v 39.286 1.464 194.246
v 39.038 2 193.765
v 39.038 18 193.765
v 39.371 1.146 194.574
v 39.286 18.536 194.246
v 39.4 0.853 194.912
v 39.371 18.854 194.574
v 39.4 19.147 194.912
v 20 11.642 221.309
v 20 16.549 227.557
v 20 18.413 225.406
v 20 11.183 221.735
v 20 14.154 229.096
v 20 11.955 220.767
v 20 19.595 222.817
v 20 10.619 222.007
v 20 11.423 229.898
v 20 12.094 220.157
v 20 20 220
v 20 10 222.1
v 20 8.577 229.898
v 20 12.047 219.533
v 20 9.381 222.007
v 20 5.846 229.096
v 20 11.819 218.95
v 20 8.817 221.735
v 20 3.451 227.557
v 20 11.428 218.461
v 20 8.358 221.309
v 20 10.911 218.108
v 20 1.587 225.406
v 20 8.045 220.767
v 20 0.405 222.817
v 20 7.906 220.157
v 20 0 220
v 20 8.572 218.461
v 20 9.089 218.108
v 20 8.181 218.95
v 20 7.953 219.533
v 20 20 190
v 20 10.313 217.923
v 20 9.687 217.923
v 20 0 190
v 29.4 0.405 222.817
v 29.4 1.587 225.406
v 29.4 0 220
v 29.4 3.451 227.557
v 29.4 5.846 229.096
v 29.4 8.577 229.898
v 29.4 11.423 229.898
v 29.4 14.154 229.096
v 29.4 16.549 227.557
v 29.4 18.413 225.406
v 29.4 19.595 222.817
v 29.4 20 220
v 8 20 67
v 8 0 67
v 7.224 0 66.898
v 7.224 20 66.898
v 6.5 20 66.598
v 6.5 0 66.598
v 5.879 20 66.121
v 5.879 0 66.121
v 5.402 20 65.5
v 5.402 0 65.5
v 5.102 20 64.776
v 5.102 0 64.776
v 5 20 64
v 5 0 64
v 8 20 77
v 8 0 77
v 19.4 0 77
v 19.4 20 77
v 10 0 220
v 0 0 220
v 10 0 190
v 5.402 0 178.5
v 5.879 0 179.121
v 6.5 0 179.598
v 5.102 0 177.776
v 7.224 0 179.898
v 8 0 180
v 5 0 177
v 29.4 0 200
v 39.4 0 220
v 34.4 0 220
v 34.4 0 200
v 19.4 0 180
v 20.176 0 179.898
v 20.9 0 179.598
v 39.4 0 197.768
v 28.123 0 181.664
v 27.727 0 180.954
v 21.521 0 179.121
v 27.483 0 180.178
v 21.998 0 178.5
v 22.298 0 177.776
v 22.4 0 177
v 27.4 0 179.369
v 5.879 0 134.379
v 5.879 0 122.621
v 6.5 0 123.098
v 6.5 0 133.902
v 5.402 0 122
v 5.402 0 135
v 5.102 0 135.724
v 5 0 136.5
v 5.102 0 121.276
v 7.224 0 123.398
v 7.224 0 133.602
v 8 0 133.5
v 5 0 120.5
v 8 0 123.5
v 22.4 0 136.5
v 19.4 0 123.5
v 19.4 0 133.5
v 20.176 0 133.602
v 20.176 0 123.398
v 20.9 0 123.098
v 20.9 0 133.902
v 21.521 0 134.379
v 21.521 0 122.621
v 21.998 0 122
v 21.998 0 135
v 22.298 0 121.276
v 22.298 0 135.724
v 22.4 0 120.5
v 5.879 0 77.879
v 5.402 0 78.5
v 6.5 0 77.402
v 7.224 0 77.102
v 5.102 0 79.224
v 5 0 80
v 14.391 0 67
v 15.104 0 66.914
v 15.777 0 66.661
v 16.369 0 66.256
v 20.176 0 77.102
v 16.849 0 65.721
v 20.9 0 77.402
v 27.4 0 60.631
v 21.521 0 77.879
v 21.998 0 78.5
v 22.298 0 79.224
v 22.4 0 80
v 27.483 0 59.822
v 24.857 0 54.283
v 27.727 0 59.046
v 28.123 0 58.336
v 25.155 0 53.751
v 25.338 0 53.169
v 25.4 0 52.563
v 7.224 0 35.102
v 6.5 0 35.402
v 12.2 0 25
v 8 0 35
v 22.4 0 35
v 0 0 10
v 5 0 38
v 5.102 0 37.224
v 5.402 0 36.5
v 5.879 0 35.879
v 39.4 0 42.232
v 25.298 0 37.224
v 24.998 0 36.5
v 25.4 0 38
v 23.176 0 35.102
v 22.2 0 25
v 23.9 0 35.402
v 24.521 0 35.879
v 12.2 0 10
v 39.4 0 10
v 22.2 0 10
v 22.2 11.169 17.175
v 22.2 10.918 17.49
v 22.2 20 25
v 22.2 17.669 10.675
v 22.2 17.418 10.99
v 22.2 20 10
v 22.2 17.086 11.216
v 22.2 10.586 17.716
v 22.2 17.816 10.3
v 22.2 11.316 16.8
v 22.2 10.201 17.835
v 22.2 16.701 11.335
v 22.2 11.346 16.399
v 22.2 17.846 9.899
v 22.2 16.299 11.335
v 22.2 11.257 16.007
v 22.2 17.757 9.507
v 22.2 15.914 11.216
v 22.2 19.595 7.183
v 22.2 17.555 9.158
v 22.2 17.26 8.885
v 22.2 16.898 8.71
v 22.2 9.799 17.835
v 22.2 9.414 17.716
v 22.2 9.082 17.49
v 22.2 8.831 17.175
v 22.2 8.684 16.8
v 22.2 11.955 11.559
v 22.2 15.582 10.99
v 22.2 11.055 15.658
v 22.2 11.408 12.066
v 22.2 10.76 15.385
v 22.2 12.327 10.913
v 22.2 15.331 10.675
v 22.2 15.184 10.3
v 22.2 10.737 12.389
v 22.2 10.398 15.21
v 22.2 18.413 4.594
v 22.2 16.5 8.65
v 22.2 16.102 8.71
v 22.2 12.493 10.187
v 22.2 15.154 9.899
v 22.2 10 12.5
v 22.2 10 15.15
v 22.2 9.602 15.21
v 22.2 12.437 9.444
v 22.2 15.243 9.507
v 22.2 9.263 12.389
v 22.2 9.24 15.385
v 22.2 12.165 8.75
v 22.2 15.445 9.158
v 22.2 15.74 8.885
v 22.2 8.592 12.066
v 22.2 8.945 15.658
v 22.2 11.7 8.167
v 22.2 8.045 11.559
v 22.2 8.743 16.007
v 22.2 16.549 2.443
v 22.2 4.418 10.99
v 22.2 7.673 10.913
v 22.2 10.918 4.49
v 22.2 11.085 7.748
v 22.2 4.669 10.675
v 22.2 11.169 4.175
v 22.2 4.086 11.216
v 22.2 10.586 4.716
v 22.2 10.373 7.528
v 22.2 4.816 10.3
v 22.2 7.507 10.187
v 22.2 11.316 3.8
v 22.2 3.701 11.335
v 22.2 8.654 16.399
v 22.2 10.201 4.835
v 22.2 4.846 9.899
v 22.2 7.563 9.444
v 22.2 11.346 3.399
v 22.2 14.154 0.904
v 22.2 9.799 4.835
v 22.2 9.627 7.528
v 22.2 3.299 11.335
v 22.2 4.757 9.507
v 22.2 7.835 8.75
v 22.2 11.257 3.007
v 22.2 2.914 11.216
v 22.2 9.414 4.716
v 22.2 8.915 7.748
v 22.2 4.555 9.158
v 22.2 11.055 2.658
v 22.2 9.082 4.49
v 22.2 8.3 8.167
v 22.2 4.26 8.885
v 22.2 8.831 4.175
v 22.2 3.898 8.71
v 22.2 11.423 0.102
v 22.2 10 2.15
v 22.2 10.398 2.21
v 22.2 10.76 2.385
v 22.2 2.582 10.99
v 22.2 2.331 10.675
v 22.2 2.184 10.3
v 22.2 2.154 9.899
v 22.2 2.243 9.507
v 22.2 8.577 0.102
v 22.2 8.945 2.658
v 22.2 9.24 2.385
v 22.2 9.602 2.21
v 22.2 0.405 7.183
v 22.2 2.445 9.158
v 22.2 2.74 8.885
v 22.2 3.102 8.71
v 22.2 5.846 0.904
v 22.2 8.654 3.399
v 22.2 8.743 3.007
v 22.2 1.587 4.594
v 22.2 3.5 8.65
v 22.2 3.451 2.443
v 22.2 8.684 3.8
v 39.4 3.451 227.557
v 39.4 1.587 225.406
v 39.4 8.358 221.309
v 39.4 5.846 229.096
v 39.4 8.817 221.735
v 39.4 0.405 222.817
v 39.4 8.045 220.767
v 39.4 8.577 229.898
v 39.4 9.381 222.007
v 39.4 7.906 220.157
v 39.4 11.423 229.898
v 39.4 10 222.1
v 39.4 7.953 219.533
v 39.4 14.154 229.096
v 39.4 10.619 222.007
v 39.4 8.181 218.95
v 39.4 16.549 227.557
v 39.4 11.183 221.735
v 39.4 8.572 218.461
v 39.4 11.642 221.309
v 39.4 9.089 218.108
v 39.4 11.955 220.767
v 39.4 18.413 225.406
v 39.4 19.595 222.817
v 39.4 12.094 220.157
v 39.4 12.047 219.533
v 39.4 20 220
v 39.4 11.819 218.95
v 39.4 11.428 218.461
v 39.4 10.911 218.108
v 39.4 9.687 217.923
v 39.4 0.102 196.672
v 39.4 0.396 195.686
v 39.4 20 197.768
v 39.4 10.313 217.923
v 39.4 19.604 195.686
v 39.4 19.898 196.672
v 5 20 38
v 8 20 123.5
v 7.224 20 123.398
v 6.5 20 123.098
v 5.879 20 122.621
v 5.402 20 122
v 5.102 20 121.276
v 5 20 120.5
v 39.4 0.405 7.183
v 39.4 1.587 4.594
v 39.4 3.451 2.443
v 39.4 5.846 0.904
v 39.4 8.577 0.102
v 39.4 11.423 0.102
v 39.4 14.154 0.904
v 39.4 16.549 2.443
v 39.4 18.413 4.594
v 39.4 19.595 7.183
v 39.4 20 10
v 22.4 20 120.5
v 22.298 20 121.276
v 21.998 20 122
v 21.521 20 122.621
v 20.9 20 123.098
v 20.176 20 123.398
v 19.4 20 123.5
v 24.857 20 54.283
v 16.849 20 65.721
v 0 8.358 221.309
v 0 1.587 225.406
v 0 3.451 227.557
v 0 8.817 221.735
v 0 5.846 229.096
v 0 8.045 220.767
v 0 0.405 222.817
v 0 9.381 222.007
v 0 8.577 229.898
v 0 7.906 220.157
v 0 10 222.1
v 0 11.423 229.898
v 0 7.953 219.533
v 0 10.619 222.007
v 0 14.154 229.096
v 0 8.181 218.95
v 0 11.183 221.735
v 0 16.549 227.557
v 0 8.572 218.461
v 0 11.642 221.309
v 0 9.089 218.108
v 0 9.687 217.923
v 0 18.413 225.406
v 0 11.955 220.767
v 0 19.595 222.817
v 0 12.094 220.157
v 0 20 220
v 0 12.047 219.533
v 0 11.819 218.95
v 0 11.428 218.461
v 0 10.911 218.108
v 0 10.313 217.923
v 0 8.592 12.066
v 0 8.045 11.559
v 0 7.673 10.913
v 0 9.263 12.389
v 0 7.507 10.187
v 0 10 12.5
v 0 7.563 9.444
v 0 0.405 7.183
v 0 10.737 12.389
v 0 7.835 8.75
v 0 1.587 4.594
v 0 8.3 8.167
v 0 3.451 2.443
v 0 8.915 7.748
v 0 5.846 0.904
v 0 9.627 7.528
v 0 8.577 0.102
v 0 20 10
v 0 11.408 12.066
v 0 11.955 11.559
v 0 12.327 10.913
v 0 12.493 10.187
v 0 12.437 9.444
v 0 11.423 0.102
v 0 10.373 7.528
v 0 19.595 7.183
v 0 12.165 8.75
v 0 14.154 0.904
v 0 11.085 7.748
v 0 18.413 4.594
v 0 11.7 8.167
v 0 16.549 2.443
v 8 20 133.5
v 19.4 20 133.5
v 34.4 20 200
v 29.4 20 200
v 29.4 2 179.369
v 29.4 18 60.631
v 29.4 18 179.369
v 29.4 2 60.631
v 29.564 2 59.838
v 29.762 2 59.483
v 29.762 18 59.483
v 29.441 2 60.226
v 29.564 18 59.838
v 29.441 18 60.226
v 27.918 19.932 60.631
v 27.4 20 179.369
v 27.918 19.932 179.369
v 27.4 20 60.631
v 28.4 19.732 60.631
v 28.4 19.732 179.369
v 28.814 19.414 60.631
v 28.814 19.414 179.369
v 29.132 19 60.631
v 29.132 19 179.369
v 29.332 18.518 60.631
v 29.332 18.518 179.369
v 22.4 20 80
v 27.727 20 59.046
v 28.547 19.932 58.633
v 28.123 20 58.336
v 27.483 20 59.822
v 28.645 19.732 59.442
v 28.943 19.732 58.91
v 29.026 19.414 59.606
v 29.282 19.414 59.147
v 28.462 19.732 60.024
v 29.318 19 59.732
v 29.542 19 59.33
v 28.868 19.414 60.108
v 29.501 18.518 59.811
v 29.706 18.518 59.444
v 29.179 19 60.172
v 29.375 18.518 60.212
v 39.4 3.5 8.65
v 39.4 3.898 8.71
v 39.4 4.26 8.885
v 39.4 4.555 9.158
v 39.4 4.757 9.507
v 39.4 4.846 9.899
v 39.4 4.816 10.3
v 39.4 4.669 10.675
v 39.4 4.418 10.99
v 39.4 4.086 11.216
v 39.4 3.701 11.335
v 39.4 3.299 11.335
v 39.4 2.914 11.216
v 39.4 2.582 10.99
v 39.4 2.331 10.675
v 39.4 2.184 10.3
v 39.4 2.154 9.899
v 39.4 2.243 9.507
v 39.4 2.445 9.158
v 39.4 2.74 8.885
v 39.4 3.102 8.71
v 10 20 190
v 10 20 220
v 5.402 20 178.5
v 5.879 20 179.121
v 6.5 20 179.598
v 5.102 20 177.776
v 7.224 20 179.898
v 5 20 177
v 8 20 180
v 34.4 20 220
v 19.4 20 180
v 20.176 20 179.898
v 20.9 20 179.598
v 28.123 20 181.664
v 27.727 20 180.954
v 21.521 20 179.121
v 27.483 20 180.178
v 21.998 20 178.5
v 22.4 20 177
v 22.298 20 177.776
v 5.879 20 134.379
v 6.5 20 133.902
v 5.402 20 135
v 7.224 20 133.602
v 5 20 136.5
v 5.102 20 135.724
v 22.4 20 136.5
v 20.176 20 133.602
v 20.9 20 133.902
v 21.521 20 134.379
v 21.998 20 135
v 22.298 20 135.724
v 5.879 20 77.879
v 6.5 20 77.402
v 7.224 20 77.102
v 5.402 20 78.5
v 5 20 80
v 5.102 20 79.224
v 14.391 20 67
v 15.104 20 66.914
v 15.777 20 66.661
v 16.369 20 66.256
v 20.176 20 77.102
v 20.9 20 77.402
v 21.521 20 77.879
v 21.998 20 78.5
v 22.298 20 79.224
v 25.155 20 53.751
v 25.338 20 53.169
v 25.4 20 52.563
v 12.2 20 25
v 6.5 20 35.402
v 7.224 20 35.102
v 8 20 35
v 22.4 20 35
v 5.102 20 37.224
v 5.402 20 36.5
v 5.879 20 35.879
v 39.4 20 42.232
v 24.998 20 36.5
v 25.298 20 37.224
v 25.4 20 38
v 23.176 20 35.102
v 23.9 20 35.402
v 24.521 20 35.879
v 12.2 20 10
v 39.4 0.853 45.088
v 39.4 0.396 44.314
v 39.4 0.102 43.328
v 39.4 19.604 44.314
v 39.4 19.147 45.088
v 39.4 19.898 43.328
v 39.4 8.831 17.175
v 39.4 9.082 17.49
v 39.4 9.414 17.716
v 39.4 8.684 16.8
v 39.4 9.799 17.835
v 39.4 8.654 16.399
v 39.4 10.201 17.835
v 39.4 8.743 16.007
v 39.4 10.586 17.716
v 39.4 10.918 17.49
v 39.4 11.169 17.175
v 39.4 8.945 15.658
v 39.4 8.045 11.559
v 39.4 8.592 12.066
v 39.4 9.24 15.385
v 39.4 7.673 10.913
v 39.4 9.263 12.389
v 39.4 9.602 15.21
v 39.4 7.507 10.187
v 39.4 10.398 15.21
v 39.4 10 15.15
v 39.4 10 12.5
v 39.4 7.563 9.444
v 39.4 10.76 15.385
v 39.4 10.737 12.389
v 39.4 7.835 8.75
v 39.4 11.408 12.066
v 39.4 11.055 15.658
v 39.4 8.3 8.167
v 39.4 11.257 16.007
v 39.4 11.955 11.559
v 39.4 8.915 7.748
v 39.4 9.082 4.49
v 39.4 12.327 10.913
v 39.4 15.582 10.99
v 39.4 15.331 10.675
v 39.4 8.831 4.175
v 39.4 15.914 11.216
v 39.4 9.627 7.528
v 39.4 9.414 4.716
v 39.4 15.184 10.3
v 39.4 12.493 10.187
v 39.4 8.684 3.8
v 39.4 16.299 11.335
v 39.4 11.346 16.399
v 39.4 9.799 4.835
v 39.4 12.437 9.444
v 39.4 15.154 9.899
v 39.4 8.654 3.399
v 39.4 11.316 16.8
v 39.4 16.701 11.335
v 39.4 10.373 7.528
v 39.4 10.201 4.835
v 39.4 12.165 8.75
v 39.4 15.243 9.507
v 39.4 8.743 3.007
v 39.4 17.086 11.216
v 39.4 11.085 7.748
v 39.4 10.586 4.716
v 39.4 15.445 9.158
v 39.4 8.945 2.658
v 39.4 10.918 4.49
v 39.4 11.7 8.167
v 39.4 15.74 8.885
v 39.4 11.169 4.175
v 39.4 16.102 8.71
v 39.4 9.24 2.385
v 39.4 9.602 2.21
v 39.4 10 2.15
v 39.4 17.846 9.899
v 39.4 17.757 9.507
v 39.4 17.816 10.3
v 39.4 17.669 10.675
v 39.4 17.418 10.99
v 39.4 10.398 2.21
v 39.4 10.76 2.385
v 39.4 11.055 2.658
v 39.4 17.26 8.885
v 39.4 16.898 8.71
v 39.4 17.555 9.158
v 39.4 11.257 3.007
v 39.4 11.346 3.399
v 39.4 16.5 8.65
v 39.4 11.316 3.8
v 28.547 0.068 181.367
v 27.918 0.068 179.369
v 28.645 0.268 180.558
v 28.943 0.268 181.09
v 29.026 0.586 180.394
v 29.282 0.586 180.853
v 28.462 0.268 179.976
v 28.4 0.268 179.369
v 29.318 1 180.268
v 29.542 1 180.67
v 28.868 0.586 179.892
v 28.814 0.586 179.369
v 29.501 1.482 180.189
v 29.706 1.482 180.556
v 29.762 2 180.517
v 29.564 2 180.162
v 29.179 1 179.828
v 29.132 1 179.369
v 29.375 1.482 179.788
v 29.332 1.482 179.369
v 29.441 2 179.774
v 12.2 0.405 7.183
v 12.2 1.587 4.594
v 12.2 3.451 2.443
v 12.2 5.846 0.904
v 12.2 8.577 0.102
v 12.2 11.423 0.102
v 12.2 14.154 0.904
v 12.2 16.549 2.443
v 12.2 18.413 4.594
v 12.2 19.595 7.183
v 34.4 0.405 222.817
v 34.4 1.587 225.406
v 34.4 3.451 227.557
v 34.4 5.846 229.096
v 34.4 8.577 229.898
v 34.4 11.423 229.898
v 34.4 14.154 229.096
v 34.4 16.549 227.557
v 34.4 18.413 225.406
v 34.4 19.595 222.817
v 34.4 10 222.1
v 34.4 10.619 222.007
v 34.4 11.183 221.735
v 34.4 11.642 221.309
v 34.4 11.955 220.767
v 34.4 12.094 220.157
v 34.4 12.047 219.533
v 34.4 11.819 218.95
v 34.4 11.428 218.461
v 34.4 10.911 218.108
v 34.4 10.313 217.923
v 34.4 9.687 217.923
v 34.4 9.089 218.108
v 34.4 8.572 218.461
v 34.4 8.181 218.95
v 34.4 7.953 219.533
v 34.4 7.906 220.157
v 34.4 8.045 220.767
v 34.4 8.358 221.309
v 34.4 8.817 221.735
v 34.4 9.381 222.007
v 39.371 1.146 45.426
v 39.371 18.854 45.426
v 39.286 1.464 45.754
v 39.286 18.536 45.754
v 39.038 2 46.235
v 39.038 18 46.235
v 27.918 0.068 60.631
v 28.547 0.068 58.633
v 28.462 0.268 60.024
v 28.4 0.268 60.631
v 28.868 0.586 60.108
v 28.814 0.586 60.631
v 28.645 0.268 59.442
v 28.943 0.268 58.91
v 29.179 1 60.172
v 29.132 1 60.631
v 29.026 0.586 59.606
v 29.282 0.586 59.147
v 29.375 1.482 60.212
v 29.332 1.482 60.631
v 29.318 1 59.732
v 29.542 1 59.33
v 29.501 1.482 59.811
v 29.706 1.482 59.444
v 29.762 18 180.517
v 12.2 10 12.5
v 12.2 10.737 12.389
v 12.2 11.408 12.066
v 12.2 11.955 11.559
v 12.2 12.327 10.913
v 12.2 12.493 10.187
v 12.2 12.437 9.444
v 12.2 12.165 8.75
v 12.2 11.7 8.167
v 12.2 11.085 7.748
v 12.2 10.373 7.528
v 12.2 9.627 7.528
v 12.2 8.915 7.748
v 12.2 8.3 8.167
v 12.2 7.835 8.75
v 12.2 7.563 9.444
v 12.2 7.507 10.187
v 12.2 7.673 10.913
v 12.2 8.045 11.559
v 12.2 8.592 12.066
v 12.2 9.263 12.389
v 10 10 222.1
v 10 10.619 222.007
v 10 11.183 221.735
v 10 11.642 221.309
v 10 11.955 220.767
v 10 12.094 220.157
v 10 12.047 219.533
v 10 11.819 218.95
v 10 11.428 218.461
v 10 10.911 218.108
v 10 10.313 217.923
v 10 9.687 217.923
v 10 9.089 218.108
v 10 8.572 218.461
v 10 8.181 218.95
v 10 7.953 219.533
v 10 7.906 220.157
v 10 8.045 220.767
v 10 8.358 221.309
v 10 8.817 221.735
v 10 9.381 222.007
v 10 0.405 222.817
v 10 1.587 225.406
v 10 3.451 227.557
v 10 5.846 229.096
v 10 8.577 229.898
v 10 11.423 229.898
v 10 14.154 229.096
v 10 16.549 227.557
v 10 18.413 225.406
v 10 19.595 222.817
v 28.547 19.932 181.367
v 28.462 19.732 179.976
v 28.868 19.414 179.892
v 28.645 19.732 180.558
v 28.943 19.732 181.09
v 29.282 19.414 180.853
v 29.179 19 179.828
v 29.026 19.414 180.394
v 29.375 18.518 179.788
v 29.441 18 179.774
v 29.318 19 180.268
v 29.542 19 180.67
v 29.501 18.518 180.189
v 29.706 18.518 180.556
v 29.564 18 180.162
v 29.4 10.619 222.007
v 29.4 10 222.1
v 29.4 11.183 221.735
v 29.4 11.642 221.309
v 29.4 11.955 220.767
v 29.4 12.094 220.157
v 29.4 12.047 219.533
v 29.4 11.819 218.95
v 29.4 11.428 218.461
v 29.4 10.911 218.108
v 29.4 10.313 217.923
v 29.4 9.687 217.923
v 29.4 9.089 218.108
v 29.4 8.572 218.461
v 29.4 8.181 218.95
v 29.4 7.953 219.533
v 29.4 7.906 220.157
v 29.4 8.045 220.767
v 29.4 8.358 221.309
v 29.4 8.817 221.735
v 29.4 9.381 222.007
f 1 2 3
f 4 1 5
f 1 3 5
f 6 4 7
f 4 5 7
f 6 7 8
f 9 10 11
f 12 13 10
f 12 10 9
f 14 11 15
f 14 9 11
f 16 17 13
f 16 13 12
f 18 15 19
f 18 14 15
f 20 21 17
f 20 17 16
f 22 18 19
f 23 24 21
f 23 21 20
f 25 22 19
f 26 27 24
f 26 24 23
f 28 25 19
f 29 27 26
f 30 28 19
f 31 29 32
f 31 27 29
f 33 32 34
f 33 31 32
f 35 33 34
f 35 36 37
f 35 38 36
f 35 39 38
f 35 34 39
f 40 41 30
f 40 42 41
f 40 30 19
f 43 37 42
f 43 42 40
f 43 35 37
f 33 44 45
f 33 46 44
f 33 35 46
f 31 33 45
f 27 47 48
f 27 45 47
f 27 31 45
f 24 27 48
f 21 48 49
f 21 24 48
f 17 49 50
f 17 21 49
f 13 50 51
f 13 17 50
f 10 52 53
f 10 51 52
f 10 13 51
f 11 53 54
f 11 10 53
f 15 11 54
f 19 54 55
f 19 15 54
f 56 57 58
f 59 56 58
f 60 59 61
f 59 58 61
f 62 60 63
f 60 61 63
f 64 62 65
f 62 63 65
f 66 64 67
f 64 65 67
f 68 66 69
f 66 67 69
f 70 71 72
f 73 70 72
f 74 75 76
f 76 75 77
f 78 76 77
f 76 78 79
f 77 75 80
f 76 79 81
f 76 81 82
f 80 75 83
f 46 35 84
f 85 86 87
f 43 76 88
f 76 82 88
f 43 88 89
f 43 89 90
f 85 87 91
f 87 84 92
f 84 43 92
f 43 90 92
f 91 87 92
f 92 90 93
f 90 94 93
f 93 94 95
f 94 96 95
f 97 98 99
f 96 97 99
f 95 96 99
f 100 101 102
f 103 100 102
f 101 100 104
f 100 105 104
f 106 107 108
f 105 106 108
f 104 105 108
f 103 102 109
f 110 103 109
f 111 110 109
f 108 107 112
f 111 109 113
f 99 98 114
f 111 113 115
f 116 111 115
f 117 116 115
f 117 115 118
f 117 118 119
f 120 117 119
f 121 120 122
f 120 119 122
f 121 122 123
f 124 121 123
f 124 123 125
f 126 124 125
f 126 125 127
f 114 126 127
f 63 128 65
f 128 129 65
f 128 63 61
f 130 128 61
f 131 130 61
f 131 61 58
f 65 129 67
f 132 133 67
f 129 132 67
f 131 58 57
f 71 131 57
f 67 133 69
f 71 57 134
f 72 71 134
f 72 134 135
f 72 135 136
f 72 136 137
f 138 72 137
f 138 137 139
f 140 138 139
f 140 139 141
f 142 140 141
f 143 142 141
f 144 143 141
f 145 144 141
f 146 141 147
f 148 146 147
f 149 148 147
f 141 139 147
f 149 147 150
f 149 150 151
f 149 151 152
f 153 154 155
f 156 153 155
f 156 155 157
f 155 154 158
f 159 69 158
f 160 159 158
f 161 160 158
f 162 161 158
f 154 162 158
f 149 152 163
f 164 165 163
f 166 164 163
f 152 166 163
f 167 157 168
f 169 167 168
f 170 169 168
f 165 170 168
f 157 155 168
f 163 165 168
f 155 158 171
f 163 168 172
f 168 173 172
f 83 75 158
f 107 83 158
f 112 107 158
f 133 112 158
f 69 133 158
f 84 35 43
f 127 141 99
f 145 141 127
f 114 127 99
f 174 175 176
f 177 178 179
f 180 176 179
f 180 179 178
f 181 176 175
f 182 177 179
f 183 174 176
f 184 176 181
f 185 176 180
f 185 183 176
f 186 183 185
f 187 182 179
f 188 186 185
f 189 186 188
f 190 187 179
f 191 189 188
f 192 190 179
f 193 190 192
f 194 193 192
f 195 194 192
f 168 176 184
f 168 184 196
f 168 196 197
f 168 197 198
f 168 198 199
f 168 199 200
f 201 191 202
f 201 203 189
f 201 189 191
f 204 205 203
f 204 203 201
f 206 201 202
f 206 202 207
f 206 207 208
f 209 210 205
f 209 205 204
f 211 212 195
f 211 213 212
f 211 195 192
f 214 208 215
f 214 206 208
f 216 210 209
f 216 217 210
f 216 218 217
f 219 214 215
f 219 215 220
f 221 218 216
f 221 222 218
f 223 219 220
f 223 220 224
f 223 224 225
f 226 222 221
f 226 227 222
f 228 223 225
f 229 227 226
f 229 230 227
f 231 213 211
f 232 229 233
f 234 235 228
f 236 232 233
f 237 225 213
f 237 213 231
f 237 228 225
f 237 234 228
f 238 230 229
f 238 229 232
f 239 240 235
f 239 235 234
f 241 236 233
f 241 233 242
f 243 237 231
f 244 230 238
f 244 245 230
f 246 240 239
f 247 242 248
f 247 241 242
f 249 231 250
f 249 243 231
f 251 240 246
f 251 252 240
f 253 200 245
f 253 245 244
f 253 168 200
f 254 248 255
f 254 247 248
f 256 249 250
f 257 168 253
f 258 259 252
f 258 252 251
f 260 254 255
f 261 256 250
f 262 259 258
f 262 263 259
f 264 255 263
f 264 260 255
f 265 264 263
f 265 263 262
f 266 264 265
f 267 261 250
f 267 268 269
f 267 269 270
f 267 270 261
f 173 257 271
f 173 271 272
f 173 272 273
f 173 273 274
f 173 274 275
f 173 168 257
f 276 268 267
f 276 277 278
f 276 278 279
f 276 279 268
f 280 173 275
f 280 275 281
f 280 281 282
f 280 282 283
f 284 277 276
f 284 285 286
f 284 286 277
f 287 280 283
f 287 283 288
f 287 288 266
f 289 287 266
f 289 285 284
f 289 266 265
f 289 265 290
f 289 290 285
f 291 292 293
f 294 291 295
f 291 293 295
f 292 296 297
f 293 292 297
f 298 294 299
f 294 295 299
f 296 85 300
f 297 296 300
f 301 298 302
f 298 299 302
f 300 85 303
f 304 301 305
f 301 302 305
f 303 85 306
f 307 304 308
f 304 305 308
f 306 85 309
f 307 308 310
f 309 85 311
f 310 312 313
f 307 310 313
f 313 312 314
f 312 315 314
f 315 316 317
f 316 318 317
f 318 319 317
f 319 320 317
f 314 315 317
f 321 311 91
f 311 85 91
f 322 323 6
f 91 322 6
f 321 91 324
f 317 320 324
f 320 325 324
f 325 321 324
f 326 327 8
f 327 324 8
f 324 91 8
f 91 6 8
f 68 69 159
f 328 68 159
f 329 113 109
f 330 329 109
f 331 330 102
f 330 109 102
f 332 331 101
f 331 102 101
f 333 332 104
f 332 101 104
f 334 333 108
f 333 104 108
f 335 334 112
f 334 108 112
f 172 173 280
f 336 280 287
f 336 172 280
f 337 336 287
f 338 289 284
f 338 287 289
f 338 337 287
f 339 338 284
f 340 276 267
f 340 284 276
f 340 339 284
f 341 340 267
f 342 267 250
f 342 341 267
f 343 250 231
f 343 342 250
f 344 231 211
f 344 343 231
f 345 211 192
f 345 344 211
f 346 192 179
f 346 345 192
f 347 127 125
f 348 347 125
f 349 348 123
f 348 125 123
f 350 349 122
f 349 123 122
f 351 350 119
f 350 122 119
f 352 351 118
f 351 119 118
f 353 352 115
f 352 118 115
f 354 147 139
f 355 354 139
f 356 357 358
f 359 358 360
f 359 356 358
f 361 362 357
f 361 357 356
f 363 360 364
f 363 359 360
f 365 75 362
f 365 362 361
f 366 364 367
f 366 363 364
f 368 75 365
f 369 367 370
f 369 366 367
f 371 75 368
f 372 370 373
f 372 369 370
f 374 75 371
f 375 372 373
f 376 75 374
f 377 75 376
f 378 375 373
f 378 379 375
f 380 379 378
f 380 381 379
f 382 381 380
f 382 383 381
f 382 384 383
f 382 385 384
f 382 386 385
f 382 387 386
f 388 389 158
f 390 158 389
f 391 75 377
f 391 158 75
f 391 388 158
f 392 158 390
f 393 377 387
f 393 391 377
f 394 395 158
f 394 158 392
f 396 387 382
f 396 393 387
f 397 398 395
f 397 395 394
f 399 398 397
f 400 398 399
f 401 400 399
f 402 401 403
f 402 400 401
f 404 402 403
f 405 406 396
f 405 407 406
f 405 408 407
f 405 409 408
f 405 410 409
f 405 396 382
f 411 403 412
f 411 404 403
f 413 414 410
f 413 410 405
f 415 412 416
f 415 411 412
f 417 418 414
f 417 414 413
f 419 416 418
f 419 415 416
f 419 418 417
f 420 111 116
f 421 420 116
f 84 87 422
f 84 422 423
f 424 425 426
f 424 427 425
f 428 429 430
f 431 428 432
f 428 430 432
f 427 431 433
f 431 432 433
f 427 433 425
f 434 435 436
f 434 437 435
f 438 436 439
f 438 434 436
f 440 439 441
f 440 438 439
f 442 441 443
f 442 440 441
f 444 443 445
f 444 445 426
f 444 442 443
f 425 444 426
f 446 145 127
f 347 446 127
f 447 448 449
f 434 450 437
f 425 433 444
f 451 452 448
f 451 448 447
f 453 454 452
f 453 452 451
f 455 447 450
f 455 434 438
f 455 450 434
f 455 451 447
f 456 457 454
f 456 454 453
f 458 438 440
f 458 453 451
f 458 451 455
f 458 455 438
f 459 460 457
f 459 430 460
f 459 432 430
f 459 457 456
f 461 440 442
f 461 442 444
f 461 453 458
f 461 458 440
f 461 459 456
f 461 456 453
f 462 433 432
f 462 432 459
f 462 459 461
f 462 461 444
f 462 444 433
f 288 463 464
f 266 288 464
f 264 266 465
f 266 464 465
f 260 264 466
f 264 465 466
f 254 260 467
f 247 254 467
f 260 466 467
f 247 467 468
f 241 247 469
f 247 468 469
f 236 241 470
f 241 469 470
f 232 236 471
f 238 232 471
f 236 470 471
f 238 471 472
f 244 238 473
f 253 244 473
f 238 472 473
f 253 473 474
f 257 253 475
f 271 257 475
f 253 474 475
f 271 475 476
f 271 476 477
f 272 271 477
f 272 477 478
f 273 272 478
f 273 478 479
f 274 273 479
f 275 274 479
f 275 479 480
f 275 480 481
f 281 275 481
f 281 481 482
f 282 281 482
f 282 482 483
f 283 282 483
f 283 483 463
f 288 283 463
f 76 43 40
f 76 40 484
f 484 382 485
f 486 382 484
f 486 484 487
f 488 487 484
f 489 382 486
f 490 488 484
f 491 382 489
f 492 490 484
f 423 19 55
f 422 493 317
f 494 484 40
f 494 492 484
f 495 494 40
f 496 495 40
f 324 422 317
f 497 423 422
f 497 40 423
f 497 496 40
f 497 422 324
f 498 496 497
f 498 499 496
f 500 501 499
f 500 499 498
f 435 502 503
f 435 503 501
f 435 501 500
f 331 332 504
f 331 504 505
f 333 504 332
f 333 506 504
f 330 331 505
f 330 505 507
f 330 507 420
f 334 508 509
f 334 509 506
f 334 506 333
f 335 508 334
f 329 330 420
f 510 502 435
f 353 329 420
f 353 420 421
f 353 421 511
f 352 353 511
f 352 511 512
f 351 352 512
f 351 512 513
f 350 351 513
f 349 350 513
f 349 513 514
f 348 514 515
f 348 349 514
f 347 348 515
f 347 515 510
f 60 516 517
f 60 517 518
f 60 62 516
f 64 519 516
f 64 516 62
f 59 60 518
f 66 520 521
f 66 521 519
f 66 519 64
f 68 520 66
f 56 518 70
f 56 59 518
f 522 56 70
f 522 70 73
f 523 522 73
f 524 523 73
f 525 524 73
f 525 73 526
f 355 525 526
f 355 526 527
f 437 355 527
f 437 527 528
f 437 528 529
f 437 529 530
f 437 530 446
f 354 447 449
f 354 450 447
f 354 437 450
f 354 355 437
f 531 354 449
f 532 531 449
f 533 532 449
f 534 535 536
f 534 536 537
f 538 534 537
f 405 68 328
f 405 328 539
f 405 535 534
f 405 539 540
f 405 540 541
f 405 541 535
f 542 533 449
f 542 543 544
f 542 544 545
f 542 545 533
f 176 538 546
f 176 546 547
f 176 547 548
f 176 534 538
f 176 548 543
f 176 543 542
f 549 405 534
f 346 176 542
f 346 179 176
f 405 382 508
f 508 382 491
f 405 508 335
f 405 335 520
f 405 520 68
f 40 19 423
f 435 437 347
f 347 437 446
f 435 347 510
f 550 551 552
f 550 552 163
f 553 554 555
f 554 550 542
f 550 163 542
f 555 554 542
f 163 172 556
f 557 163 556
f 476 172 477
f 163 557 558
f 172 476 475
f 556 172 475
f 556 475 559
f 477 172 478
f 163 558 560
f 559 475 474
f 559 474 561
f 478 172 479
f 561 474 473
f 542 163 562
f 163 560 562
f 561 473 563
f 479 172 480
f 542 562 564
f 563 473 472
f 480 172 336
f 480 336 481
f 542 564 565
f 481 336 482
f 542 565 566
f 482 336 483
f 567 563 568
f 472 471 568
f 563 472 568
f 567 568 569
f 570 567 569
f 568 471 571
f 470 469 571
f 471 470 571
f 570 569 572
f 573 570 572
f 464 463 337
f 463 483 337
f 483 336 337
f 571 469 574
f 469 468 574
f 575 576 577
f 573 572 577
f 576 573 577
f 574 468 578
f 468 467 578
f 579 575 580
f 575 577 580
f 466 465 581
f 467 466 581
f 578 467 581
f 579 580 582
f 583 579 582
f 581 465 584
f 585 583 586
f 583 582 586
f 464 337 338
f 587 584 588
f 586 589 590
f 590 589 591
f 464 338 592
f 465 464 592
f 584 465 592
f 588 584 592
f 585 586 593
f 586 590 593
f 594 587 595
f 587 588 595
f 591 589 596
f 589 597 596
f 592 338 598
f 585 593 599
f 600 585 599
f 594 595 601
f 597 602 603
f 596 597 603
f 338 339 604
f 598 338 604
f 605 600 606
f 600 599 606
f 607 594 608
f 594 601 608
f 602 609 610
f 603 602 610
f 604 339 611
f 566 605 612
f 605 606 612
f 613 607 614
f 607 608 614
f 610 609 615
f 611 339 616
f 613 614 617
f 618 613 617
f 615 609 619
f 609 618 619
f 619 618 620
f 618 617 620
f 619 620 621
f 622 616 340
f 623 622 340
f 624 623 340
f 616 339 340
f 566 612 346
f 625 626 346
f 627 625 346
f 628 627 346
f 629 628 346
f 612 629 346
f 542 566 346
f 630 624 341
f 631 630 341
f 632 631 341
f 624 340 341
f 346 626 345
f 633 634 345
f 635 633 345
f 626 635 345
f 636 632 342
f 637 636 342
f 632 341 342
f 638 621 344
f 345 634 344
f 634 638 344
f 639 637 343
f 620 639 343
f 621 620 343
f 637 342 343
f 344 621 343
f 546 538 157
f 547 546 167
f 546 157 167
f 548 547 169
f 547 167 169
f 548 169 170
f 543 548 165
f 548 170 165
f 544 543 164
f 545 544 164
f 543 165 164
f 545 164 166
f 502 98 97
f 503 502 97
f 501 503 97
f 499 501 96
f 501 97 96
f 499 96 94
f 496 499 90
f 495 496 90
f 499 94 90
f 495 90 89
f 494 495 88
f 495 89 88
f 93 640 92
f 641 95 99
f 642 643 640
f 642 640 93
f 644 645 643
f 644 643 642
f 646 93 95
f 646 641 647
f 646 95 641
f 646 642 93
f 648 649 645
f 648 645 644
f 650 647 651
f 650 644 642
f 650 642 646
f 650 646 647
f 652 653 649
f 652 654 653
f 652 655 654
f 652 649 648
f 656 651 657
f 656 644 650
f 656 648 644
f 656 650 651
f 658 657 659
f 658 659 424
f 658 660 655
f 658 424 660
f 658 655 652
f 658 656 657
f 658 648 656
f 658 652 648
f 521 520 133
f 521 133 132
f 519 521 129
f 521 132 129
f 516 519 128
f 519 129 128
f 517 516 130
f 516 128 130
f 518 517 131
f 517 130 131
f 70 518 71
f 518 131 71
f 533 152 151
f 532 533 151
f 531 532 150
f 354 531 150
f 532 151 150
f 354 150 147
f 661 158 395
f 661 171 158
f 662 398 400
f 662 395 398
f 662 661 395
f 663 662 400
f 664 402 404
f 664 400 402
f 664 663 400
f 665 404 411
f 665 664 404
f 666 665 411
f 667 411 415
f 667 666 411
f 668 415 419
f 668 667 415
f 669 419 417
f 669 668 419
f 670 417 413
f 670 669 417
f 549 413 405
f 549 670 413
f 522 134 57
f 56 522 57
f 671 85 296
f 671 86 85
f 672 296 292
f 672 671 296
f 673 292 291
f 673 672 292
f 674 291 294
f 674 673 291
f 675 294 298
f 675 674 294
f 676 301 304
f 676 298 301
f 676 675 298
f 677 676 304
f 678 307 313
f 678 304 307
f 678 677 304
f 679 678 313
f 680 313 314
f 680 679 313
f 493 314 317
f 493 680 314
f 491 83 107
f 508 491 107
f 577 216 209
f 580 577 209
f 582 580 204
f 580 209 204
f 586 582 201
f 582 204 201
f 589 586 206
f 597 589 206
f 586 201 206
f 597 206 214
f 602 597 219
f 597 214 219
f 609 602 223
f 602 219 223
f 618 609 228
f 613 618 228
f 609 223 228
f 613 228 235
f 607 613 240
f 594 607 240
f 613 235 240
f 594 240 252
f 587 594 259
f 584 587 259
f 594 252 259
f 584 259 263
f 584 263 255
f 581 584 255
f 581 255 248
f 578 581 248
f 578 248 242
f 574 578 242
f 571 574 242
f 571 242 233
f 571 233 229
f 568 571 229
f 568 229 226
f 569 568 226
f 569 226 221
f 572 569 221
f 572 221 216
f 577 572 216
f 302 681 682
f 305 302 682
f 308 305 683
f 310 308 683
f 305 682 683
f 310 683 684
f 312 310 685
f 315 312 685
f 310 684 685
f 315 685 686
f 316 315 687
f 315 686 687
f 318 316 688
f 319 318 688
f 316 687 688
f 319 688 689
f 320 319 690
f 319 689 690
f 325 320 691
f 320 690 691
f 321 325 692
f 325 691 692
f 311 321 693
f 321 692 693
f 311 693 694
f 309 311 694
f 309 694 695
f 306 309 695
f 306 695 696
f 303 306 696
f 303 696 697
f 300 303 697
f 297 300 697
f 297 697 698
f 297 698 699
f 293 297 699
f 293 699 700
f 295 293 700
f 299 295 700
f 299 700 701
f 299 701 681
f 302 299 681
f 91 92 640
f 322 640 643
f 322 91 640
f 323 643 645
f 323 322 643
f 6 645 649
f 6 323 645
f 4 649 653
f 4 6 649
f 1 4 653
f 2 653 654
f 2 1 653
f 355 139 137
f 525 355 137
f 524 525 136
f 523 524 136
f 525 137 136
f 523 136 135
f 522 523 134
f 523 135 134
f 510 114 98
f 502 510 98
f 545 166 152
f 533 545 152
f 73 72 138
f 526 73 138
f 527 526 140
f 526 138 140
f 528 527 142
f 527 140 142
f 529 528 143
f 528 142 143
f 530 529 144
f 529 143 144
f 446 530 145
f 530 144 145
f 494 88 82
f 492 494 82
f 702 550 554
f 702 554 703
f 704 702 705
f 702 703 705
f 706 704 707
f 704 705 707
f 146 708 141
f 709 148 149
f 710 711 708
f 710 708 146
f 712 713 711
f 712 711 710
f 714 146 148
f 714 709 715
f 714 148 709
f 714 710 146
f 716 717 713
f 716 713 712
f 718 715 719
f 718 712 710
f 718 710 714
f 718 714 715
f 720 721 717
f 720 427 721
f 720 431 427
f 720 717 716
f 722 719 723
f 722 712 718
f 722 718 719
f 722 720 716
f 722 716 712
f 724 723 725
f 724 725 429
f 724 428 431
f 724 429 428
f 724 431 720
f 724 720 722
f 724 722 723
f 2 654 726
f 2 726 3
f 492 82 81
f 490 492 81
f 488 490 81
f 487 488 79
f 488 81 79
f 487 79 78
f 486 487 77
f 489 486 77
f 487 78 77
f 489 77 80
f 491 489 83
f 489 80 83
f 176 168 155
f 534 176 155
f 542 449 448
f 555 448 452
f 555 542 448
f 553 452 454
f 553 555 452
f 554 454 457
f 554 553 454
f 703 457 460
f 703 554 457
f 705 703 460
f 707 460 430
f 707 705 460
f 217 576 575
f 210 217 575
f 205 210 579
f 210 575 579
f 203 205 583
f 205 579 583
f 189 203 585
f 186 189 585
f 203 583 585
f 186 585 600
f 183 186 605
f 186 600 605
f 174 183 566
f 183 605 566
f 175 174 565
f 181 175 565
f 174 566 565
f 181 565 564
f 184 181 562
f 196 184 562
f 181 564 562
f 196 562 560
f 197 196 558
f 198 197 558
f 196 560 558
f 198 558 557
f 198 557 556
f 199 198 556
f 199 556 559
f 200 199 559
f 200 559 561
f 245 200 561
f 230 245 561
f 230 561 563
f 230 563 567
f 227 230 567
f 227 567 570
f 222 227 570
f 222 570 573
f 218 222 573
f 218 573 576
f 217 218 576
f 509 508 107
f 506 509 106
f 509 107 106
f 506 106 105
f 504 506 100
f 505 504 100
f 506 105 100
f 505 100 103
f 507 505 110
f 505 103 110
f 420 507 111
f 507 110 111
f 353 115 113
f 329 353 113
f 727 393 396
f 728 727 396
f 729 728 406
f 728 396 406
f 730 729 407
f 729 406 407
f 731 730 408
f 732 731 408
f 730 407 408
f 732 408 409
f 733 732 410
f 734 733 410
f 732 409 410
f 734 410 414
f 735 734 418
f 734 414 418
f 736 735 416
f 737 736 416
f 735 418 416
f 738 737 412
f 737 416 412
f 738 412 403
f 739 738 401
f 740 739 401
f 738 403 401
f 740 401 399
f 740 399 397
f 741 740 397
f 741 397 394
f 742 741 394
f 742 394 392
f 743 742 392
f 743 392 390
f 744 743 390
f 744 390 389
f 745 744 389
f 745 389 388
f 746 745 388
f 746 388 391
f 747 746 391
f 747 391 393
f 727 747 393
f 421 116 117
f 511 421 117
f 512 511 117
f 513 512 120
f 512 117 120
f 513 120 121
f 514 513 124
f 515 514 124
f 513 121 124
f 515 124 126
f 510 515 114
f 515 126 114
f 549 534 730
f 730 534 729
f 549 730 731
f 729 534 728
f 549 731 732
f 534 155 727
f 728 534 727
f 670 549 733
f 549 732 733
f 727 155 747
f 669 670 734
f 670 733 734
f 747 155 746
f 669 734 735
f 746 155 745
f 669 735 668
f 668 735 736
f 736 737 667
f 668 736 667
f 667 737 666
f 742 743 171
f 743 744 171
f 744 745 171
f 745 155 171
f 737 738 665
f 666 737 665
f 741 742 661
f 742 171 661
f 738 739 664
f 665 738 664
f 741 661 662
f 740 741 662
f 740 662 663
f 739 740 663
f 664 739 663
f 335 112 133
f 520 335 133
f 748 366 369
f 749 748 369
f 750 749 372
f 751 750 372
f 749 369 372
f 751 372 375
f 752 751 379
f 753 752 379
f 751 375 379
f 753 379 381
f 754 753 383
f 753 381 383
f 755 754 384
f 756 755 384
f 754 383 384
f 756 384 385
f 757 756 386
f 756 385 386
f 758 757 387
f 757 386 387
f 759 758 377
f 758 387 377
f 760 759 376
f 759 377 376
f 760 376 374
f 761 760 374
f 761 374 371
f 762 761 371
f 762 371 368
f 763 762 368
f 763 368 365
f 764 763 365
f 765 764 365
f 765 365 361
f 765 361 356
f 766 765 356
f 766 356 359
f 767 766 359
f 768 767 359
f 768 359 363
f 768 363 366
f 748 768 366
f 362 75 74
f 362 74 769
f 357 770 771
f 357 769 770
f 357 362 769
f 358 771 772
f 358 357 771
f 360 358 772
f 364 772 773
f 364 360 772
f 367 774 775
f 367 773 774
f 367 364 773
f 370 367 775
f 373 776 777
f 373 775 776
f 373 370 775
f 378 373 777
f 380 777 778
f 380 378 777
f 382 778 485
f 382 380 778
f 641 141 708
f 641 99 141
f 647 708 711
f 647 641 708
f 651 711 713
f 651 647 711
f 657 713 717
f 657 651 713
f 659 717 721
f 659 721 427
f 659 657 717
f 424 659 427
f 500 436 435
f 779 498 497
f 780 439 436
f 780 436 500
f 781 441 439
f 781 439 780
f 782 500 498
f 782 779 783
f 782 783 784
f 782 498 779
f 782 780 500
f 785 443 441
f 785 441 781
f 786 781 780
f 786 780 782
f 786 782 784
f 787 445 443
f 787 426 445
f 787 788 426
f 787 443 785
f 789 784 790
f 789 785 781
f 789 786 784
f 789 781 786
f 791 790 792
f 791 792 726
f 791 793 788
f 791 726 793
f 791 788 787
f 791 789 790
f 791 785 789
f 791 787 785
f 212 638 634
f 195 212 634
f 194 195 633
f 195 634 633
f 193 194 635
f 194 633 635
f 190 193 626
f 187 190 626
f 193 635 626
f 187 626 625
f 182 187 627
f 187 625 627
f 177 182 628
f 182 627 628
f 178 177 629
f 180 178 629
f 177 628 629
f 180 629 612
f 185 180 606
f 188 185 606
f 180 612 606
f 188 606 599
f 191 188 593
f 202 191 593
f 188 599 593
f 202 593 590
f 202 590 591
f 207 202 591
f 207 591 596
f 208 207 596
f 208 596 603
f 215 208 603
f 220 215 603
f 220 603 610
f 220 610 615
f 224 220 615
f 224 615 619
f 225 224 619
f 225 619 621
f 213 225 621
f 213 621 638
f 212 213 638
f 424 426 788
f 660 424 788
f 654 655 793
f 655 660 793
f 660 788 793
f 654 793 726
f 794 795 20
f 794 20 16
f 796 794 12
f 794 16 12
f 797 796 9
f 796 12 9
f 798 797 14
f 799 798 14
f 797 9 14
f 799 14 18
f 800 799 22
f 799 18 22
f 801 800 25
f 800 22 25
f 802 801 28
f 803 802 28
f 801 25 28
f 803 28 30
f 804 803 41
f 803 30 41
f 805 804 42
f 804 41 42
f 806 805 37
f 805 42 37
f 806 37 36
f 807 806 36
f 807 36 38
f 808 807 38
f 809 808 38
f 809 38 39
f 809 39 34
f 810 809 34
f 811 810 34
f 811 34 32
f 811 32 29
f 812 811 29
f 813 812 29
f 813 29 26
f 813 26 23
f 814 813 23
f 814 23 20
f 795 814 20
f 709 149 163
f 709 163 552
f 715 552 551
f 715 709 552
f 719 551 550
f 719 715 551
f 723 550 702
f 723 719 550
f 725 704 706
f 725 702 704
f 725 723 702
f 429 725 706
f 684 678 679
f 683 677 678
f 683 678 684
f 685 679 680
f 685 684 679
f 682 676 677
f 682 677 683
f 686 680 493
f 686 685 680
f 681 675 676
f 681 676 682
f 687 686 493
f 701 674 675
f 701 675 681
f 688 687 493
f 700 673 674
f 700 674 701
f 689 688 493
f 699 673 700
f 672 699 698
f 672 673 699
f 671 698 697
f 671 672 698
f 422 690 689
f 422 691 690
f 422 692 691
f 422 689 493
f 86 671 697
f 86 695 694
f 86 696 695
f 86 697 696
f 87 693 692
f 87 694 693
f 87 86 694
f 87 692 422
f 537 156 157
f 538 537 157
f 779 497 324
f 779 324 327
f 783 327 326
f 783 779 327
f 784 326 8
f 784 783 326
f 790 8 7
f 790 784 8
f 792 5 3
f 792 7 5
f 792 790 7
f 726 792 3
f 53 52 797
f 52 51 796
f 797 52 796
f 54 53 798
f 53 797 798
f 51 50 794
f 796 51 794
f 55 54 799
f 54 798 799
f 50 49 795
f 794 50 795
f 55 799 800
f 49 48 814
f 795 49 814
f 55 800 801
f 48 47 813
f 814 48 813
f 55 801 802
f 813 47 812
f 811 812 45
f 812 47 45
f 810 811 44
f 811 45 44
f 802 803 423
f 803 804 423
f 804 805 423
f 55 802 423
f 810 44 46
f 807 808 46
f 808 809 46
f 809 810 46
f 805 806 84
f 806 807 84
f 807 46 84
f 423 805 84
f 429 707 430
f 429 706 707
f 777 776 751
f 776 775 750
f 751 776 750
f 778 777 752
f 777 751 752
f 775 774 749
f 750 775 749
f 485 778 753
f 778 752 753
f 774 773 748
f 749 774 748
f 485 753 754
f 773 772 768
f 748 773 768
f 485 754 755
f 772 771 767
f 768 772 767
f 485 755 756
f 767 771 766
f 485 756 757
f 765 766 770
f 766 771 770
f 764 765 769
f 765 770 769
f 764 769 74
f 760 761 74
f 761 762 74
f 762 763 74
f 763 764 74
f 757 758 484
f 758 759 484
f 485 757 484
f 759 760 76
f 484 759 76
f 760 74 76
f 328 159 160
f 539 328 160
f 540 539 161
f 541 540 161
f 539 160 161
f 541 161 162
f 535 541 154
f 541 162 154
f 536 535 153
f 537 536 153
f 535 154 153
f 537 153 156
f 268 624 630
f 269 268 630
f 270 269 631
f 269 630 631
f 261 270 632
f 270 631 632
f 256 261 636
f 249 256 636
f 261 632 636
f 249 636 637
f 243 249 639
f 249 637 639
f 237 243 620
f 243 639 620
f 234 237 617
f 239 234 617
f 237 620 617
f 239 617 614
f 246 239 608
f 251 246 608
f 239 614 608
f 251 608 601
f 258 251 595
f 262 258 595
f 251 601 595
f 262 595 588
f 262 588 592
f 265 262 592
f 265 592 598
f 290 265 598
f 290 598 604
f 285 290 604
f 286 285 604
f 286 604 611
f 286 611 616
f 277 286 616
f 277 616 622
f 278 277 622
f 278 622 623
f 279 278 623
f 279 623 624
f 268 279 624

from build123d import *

# Parameters (mm, degrees)
SKETCH_1_W          = 39.4
SKETCH_1_H          = 20
EXTRUDE_1_DEPTH     = 230
FILLET_2_RADIUS     = 10
FILLET_2_LENGTH     = 39.4
SKETCH_2_R          = 2.5
CUT_EXTRUDE_1_DEPTH = 235.205806931
SKETCH_3_W          = 10
SKETCH_3_H          = 25
CUT_EXTRUDE_2_DEPTH = 235.205806931
SKETCH_4_R          = 1.35
CUT_EXTRUDE_3_DEPTH = 20
CUT_EXTRUDE_4_DEPTH = 235.205806931
FILLET_4_R          = 2
FILLET_5_RADIUS     = 10
FILLET_5_LENGTH     = 39.4
SKETCH_6_R          = 2.1
CUT_EXTRUDE_5_DEPTH = 235.205806931
SKETCH_7_W          = 10
SKETCH_7_H          = 40
CUT_EXTRUDE_6_DEPTH = 235.205806931
CUT_EXTRUDE_7_DEPTH = 235.205806931
SKETCH_9_W          = 5
SKETCH_9_H          = 30
CUT_EXTRUDE_8_DEPTH = 235.205806931


with BuildPart() as part:
    # 草图1 → 凸台-拉伸1 (new body)
    with BuildSketch(Plane.XY):
        with Locations((19.7, 10)):
            Rectangle(SKETCH_1_W, SKETCH_1_H)
    extrude(amount=EXTRUDE_1_DEPTH)

    # 圆角2: full round fillet: the end face becomes a half cylinder, R = half its width
    fillet_2_face = Plane((19.7, 10, 0), x_dir=(1, 0, 0), z_dir=(0, 0, -1))  # on the end face: x along it, z out of the body
    fillet_2_slab = fillet_2_face.offset(-FILLET_2_RADIUS / 2) * Box(FILLET_2_LENGTH, 2 * FILLET_2_RADIUS, FILLET_2_RADIUS, mode=Mode.PRIVATE)  # the body's end, R deep
    fillet_2_round = Plane((19.7, 10, 10), x_dir=(0, 0, -1), z_dir=(1, 0, 0)) * Cylinder(FILLET_2_RADIUS, FILLET_2_LENGTH, mode=Mode.PRIVATE)  # its axis R under the face
    add(fillet_2_slab - fillet_2_round, mode=Mode.SUBTRACT)

    # 草图2 → 切除-拉伸1 (cut, through all)
    with BuildSketch(Plane.ZY):
        with Locations((10, 10)):
            Circle(SKETCH_2_R)
    extrude(amount=-CUT_EXTRUDE_1_DEPTH, mode=Mode.SUBTRACT)

    # 草图3 → 切除-拉伸2 (cut, through all)
    with BuildSketch(Plane(origin=(0, 0, 0), x_dir=(-1, 0, 0), z_dir=(0, -1, 0))):
        with Locations((-17.2, -12.5)):
            Rectangle(SKETCH_3_W, SKETCH_3_H)
    extrude(amount=-CUT_EXTRUDE_2_DEPTH, mode=Mode.SUBTRACT)

    # 草图4 → 切除-拉伸3 (cut)
    with BuildSketch(Plane(origin=(39.4, 0, 0), x_dir=(0, 0, -1), z_dir=(1, 0, 0))):
        with Locations((-3.5, 10)):
            Circle(SKETCH_4_R)
        with Locations((-10, 16.5)):
            Circle(SKETCH_4_R)
        with Locations((-16.5, 10)):
            Circle(SKETCH_4_R)
        with Locations((-10, 3.5)):
            Circle(SKETCH_4_R)
    extrude(amount=-CUT_EXTRUDE_3_DEPTH, mode=Mode.SUBTRACT)

    # 草图5 → 切除-拉伸4 (cut, through all)
    with BuildSketch(Plane(origin=(0, 0, 0), x_dir=(-1, 0, 0), z_dir=(0, -1, 0))):
        Polygon((-39.4, -45.718519933), (-29.4, -60), (-29.4, -180), (-39.4, -194.281480067), align=None)
    extrude(amount=-CUT_EXTRUDE_4_DEPTH, mode=Mode.SUBTRACT)

    # 圆角4
    fillet_4_edges = [part.edges().sort_by_distance(p)[0] for p in [
        (39.4, 10, 194.281480067),
        (34.4, 20, 52.859259966),
        (39.4, 10, 45.718519933),
        (29.4, 20, 120),
        (29.4, 10, 60),
        (34.4, 20, 187.140740034),
        (29.4, 10, 180),
        (34.4, 0, 187.140740034),
        (29.4, 0, 120),
        (34.4, 0, 52.859259966),
    ]]
    fillet(fillet_4_edges, radius=FILLET_4_R)

    # 圆角5: full round fillet: the end face becomes a half cylinder, R = half its width
    fillet_5_face = Plane((19.7, 10, 230), x_dir=(-1, 0, 0), z_dir=(0, 0, 1))  # on the end face: x along it, z out of the body
    fillet_5_slab = fillet_5_face.offset(-FILLET_5_RADIUS / 2) * Box(FILLET_5_LENGTH, 2 * FILLET_5_RADIUS, FILLET_5_RADIUS, mode=Mode.PRIVATE)  # the body's end, R deep
    fillet_5_round = Plane((19.7, 10, 220), x_dir=(0, 0, 1), z_dir=(-1, 0, 0)) * Cylinder(FILLET_5_RADIUS, FILLET_5_LENGTH, mode=Mode.PRIVATE)  # its axis R under the face
    add(fillet_5_slab - fillet_5_round, mode=Mode.SUBTRACT)

    # 草图6 → 切除-拉伸5 (cut, through all)
    with BuildSketch(Plane.ZY):
        with Locations((220, 10)):
            Circle(SKETCH_6_R)
    extrude(amount=-CUT_EXTRUDE_5_DEPTH, mode=Mode.SUBTRACT)

    # 草图7 → 切除-拉伸6 (cut, through all)
    with BuildSketch(Plane(origin=(0, 0, 0), x_dir=(-1, 0, 0), z_dir=(0, -1, 0))):
        with Locations((-15, -210)):
            Rectangle(SKETCH_7_W, SKETCH_7_H)
    extrude(amount=-CUT_EXTRUDE_6_DEPTH, mode=Mode.SUBTRACT)

    # 草图8 → 切除-拉伸7 (cut, through all)
    with BuildSketch(Plane(origin=(0, 0, 0), x_dir=(-1, 0, 0), z_dir=(0, -1, 0))):
        with BuildLine():
            Line((-5, -64), (-5, -38))
            ThreePointArc((-5, -38), (-5.878679656, -35.878679656), (-8, -35))
            Line((-8, -35), (-22.4, -35))
            ThreePointArc((-22.4, -35), (-24.521320344, -35.878679656), (-25.4, -38))
            Line((-25.4, -38), (-25.4, -52.562568091))
            ThreePointArc((-25.4, -52.562568091), (-25.261150852, -53.464685489), (-24.857456133, -54.2832974))
            Line((-24.857456133, -54.2832974), (-16.848880092, -65.720729309))
            ThreePointArc((-16.848880092, -65.720729309), (-15.776669799, -66.6610325), (-14.39142396, -67))
            Line((-14.39142396, -67), (-8, -67))
            ThreePointArc((-8, -67), (-5.878679656, -66.121320344), (-5, -64))
        make_face()
        with BuildLine():
            Line((-8, -77), (-19.4, -77))
            ThreePointArc((-19.4, -77), (-21.521320344, -77.878679656), (-22.4, -80))
            Line((-22.4, -80), (-22.4, -120.5))
            ThreePointArc((-22.4, -120.5), (-21.521320344, -122.621320344), (-19.4, -123.5))
            Line((-19.4, -123.5), (-8, -123.5))
            ThreePointArc((-8, -123.5), (-5.878679656, -122.621320344), (-5, -120.5))
            Line((-5, -120.5), (-5, -80))
            ThreePointArc((-5, -80), (-5.878679656, -77.878679656), (-8, -77))
        make_face()
        with BuildLine():
            Line((-8, -133.5), (-19.4, -133.5))
            ThreePointArc((-19.4, -133.5), (-21.521320344, -134.378679656), (-22.4, -136.5))
            Line((-22.4, -136.5), (-22.4, -177))
            ThreePointArc((-22.4, -177), (-21.521320344, -179.121320344), (-19.4, -180))
            Line((-19.4, -180), (-8, -180))
            ThreePointArc((-8, -180), (-5.878679656, -179.121320344), (-5, -177))
            Line((-5, -177), (-5, -136.5))
            ThreePointArc((-5, -136.5), (-5.878679656, -134.378679656), (-8, -133.5))
        make_face()
    extrude(amount=-CUT_EXTRUDE_7_DEPTH, mode=Mode.SUBTRACT)

    # 草图9 → 切除-拉伸8 (cut, through all)
    with BuildSketch(Plane(origin=(0, 0, 0), x_dir=(-1, 0, 0), z_dir=(0, -1, 0))):
        with Locations((-31.9, -215)):
            Rectangle(SKETCH_9_W, SKETCH_9_H)
    extrude(amount=-CUT_EXTRUDE_8_DEPTH, mode=Mode.SUBTRACT)


solid = part.part
